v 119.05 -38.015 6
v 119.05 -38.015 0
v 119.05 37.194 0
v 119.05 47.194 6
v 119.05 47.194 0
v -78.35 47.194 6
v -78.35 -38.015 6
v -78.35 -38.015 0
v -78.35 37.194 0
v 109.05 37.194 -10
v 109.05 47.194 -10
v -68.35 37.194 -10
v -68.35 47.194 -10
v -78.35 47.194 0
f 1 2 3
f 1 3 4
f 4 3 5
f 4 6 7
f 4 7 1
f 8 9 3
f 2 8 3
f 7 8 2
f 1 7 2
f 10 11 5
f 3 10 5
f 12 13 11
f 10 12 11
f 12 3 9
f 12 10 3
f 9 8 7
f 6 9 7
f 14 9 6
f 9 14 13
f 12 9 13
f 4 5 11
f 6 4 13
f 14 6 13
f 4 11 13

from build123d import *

# Parameters (mm, degrees)
SKETCH1_W           = 197.4
SKETCH1_H           = 85.209366976
BOSS_EXTRUDE1_DEPTH = 6
BOSS_EXTRUDE2_DEPTH = 10


with BuildPart() as part:
    # Sketch1 → Boss-Extrude1 (new body)
    with BuildSketch(Plane.XY):
        with Locations((20.35, 4.589716511)):
            Rectangle(SKETCH1_W, SKETCH1_H)
    extrude(amount=BOSS_EXTRUDE1_DEPTH)

    # Sketch2 → Boss-Extrude2 (add)
    with BuildSketch(Plane(origin=(0, 47.194399999, 0), x_dir=(1, 0, 0), z_dir=(0, 1, 0))):
        Polygon((-78.35, 0), (-68.35, 10), (109.05, 10), (119.05, 0), (119.05, -6), (-78.35, -6), align=None)
    extrude(amount=-BOSS_EXTRUDE2_DEPTH)


solid = part.part
